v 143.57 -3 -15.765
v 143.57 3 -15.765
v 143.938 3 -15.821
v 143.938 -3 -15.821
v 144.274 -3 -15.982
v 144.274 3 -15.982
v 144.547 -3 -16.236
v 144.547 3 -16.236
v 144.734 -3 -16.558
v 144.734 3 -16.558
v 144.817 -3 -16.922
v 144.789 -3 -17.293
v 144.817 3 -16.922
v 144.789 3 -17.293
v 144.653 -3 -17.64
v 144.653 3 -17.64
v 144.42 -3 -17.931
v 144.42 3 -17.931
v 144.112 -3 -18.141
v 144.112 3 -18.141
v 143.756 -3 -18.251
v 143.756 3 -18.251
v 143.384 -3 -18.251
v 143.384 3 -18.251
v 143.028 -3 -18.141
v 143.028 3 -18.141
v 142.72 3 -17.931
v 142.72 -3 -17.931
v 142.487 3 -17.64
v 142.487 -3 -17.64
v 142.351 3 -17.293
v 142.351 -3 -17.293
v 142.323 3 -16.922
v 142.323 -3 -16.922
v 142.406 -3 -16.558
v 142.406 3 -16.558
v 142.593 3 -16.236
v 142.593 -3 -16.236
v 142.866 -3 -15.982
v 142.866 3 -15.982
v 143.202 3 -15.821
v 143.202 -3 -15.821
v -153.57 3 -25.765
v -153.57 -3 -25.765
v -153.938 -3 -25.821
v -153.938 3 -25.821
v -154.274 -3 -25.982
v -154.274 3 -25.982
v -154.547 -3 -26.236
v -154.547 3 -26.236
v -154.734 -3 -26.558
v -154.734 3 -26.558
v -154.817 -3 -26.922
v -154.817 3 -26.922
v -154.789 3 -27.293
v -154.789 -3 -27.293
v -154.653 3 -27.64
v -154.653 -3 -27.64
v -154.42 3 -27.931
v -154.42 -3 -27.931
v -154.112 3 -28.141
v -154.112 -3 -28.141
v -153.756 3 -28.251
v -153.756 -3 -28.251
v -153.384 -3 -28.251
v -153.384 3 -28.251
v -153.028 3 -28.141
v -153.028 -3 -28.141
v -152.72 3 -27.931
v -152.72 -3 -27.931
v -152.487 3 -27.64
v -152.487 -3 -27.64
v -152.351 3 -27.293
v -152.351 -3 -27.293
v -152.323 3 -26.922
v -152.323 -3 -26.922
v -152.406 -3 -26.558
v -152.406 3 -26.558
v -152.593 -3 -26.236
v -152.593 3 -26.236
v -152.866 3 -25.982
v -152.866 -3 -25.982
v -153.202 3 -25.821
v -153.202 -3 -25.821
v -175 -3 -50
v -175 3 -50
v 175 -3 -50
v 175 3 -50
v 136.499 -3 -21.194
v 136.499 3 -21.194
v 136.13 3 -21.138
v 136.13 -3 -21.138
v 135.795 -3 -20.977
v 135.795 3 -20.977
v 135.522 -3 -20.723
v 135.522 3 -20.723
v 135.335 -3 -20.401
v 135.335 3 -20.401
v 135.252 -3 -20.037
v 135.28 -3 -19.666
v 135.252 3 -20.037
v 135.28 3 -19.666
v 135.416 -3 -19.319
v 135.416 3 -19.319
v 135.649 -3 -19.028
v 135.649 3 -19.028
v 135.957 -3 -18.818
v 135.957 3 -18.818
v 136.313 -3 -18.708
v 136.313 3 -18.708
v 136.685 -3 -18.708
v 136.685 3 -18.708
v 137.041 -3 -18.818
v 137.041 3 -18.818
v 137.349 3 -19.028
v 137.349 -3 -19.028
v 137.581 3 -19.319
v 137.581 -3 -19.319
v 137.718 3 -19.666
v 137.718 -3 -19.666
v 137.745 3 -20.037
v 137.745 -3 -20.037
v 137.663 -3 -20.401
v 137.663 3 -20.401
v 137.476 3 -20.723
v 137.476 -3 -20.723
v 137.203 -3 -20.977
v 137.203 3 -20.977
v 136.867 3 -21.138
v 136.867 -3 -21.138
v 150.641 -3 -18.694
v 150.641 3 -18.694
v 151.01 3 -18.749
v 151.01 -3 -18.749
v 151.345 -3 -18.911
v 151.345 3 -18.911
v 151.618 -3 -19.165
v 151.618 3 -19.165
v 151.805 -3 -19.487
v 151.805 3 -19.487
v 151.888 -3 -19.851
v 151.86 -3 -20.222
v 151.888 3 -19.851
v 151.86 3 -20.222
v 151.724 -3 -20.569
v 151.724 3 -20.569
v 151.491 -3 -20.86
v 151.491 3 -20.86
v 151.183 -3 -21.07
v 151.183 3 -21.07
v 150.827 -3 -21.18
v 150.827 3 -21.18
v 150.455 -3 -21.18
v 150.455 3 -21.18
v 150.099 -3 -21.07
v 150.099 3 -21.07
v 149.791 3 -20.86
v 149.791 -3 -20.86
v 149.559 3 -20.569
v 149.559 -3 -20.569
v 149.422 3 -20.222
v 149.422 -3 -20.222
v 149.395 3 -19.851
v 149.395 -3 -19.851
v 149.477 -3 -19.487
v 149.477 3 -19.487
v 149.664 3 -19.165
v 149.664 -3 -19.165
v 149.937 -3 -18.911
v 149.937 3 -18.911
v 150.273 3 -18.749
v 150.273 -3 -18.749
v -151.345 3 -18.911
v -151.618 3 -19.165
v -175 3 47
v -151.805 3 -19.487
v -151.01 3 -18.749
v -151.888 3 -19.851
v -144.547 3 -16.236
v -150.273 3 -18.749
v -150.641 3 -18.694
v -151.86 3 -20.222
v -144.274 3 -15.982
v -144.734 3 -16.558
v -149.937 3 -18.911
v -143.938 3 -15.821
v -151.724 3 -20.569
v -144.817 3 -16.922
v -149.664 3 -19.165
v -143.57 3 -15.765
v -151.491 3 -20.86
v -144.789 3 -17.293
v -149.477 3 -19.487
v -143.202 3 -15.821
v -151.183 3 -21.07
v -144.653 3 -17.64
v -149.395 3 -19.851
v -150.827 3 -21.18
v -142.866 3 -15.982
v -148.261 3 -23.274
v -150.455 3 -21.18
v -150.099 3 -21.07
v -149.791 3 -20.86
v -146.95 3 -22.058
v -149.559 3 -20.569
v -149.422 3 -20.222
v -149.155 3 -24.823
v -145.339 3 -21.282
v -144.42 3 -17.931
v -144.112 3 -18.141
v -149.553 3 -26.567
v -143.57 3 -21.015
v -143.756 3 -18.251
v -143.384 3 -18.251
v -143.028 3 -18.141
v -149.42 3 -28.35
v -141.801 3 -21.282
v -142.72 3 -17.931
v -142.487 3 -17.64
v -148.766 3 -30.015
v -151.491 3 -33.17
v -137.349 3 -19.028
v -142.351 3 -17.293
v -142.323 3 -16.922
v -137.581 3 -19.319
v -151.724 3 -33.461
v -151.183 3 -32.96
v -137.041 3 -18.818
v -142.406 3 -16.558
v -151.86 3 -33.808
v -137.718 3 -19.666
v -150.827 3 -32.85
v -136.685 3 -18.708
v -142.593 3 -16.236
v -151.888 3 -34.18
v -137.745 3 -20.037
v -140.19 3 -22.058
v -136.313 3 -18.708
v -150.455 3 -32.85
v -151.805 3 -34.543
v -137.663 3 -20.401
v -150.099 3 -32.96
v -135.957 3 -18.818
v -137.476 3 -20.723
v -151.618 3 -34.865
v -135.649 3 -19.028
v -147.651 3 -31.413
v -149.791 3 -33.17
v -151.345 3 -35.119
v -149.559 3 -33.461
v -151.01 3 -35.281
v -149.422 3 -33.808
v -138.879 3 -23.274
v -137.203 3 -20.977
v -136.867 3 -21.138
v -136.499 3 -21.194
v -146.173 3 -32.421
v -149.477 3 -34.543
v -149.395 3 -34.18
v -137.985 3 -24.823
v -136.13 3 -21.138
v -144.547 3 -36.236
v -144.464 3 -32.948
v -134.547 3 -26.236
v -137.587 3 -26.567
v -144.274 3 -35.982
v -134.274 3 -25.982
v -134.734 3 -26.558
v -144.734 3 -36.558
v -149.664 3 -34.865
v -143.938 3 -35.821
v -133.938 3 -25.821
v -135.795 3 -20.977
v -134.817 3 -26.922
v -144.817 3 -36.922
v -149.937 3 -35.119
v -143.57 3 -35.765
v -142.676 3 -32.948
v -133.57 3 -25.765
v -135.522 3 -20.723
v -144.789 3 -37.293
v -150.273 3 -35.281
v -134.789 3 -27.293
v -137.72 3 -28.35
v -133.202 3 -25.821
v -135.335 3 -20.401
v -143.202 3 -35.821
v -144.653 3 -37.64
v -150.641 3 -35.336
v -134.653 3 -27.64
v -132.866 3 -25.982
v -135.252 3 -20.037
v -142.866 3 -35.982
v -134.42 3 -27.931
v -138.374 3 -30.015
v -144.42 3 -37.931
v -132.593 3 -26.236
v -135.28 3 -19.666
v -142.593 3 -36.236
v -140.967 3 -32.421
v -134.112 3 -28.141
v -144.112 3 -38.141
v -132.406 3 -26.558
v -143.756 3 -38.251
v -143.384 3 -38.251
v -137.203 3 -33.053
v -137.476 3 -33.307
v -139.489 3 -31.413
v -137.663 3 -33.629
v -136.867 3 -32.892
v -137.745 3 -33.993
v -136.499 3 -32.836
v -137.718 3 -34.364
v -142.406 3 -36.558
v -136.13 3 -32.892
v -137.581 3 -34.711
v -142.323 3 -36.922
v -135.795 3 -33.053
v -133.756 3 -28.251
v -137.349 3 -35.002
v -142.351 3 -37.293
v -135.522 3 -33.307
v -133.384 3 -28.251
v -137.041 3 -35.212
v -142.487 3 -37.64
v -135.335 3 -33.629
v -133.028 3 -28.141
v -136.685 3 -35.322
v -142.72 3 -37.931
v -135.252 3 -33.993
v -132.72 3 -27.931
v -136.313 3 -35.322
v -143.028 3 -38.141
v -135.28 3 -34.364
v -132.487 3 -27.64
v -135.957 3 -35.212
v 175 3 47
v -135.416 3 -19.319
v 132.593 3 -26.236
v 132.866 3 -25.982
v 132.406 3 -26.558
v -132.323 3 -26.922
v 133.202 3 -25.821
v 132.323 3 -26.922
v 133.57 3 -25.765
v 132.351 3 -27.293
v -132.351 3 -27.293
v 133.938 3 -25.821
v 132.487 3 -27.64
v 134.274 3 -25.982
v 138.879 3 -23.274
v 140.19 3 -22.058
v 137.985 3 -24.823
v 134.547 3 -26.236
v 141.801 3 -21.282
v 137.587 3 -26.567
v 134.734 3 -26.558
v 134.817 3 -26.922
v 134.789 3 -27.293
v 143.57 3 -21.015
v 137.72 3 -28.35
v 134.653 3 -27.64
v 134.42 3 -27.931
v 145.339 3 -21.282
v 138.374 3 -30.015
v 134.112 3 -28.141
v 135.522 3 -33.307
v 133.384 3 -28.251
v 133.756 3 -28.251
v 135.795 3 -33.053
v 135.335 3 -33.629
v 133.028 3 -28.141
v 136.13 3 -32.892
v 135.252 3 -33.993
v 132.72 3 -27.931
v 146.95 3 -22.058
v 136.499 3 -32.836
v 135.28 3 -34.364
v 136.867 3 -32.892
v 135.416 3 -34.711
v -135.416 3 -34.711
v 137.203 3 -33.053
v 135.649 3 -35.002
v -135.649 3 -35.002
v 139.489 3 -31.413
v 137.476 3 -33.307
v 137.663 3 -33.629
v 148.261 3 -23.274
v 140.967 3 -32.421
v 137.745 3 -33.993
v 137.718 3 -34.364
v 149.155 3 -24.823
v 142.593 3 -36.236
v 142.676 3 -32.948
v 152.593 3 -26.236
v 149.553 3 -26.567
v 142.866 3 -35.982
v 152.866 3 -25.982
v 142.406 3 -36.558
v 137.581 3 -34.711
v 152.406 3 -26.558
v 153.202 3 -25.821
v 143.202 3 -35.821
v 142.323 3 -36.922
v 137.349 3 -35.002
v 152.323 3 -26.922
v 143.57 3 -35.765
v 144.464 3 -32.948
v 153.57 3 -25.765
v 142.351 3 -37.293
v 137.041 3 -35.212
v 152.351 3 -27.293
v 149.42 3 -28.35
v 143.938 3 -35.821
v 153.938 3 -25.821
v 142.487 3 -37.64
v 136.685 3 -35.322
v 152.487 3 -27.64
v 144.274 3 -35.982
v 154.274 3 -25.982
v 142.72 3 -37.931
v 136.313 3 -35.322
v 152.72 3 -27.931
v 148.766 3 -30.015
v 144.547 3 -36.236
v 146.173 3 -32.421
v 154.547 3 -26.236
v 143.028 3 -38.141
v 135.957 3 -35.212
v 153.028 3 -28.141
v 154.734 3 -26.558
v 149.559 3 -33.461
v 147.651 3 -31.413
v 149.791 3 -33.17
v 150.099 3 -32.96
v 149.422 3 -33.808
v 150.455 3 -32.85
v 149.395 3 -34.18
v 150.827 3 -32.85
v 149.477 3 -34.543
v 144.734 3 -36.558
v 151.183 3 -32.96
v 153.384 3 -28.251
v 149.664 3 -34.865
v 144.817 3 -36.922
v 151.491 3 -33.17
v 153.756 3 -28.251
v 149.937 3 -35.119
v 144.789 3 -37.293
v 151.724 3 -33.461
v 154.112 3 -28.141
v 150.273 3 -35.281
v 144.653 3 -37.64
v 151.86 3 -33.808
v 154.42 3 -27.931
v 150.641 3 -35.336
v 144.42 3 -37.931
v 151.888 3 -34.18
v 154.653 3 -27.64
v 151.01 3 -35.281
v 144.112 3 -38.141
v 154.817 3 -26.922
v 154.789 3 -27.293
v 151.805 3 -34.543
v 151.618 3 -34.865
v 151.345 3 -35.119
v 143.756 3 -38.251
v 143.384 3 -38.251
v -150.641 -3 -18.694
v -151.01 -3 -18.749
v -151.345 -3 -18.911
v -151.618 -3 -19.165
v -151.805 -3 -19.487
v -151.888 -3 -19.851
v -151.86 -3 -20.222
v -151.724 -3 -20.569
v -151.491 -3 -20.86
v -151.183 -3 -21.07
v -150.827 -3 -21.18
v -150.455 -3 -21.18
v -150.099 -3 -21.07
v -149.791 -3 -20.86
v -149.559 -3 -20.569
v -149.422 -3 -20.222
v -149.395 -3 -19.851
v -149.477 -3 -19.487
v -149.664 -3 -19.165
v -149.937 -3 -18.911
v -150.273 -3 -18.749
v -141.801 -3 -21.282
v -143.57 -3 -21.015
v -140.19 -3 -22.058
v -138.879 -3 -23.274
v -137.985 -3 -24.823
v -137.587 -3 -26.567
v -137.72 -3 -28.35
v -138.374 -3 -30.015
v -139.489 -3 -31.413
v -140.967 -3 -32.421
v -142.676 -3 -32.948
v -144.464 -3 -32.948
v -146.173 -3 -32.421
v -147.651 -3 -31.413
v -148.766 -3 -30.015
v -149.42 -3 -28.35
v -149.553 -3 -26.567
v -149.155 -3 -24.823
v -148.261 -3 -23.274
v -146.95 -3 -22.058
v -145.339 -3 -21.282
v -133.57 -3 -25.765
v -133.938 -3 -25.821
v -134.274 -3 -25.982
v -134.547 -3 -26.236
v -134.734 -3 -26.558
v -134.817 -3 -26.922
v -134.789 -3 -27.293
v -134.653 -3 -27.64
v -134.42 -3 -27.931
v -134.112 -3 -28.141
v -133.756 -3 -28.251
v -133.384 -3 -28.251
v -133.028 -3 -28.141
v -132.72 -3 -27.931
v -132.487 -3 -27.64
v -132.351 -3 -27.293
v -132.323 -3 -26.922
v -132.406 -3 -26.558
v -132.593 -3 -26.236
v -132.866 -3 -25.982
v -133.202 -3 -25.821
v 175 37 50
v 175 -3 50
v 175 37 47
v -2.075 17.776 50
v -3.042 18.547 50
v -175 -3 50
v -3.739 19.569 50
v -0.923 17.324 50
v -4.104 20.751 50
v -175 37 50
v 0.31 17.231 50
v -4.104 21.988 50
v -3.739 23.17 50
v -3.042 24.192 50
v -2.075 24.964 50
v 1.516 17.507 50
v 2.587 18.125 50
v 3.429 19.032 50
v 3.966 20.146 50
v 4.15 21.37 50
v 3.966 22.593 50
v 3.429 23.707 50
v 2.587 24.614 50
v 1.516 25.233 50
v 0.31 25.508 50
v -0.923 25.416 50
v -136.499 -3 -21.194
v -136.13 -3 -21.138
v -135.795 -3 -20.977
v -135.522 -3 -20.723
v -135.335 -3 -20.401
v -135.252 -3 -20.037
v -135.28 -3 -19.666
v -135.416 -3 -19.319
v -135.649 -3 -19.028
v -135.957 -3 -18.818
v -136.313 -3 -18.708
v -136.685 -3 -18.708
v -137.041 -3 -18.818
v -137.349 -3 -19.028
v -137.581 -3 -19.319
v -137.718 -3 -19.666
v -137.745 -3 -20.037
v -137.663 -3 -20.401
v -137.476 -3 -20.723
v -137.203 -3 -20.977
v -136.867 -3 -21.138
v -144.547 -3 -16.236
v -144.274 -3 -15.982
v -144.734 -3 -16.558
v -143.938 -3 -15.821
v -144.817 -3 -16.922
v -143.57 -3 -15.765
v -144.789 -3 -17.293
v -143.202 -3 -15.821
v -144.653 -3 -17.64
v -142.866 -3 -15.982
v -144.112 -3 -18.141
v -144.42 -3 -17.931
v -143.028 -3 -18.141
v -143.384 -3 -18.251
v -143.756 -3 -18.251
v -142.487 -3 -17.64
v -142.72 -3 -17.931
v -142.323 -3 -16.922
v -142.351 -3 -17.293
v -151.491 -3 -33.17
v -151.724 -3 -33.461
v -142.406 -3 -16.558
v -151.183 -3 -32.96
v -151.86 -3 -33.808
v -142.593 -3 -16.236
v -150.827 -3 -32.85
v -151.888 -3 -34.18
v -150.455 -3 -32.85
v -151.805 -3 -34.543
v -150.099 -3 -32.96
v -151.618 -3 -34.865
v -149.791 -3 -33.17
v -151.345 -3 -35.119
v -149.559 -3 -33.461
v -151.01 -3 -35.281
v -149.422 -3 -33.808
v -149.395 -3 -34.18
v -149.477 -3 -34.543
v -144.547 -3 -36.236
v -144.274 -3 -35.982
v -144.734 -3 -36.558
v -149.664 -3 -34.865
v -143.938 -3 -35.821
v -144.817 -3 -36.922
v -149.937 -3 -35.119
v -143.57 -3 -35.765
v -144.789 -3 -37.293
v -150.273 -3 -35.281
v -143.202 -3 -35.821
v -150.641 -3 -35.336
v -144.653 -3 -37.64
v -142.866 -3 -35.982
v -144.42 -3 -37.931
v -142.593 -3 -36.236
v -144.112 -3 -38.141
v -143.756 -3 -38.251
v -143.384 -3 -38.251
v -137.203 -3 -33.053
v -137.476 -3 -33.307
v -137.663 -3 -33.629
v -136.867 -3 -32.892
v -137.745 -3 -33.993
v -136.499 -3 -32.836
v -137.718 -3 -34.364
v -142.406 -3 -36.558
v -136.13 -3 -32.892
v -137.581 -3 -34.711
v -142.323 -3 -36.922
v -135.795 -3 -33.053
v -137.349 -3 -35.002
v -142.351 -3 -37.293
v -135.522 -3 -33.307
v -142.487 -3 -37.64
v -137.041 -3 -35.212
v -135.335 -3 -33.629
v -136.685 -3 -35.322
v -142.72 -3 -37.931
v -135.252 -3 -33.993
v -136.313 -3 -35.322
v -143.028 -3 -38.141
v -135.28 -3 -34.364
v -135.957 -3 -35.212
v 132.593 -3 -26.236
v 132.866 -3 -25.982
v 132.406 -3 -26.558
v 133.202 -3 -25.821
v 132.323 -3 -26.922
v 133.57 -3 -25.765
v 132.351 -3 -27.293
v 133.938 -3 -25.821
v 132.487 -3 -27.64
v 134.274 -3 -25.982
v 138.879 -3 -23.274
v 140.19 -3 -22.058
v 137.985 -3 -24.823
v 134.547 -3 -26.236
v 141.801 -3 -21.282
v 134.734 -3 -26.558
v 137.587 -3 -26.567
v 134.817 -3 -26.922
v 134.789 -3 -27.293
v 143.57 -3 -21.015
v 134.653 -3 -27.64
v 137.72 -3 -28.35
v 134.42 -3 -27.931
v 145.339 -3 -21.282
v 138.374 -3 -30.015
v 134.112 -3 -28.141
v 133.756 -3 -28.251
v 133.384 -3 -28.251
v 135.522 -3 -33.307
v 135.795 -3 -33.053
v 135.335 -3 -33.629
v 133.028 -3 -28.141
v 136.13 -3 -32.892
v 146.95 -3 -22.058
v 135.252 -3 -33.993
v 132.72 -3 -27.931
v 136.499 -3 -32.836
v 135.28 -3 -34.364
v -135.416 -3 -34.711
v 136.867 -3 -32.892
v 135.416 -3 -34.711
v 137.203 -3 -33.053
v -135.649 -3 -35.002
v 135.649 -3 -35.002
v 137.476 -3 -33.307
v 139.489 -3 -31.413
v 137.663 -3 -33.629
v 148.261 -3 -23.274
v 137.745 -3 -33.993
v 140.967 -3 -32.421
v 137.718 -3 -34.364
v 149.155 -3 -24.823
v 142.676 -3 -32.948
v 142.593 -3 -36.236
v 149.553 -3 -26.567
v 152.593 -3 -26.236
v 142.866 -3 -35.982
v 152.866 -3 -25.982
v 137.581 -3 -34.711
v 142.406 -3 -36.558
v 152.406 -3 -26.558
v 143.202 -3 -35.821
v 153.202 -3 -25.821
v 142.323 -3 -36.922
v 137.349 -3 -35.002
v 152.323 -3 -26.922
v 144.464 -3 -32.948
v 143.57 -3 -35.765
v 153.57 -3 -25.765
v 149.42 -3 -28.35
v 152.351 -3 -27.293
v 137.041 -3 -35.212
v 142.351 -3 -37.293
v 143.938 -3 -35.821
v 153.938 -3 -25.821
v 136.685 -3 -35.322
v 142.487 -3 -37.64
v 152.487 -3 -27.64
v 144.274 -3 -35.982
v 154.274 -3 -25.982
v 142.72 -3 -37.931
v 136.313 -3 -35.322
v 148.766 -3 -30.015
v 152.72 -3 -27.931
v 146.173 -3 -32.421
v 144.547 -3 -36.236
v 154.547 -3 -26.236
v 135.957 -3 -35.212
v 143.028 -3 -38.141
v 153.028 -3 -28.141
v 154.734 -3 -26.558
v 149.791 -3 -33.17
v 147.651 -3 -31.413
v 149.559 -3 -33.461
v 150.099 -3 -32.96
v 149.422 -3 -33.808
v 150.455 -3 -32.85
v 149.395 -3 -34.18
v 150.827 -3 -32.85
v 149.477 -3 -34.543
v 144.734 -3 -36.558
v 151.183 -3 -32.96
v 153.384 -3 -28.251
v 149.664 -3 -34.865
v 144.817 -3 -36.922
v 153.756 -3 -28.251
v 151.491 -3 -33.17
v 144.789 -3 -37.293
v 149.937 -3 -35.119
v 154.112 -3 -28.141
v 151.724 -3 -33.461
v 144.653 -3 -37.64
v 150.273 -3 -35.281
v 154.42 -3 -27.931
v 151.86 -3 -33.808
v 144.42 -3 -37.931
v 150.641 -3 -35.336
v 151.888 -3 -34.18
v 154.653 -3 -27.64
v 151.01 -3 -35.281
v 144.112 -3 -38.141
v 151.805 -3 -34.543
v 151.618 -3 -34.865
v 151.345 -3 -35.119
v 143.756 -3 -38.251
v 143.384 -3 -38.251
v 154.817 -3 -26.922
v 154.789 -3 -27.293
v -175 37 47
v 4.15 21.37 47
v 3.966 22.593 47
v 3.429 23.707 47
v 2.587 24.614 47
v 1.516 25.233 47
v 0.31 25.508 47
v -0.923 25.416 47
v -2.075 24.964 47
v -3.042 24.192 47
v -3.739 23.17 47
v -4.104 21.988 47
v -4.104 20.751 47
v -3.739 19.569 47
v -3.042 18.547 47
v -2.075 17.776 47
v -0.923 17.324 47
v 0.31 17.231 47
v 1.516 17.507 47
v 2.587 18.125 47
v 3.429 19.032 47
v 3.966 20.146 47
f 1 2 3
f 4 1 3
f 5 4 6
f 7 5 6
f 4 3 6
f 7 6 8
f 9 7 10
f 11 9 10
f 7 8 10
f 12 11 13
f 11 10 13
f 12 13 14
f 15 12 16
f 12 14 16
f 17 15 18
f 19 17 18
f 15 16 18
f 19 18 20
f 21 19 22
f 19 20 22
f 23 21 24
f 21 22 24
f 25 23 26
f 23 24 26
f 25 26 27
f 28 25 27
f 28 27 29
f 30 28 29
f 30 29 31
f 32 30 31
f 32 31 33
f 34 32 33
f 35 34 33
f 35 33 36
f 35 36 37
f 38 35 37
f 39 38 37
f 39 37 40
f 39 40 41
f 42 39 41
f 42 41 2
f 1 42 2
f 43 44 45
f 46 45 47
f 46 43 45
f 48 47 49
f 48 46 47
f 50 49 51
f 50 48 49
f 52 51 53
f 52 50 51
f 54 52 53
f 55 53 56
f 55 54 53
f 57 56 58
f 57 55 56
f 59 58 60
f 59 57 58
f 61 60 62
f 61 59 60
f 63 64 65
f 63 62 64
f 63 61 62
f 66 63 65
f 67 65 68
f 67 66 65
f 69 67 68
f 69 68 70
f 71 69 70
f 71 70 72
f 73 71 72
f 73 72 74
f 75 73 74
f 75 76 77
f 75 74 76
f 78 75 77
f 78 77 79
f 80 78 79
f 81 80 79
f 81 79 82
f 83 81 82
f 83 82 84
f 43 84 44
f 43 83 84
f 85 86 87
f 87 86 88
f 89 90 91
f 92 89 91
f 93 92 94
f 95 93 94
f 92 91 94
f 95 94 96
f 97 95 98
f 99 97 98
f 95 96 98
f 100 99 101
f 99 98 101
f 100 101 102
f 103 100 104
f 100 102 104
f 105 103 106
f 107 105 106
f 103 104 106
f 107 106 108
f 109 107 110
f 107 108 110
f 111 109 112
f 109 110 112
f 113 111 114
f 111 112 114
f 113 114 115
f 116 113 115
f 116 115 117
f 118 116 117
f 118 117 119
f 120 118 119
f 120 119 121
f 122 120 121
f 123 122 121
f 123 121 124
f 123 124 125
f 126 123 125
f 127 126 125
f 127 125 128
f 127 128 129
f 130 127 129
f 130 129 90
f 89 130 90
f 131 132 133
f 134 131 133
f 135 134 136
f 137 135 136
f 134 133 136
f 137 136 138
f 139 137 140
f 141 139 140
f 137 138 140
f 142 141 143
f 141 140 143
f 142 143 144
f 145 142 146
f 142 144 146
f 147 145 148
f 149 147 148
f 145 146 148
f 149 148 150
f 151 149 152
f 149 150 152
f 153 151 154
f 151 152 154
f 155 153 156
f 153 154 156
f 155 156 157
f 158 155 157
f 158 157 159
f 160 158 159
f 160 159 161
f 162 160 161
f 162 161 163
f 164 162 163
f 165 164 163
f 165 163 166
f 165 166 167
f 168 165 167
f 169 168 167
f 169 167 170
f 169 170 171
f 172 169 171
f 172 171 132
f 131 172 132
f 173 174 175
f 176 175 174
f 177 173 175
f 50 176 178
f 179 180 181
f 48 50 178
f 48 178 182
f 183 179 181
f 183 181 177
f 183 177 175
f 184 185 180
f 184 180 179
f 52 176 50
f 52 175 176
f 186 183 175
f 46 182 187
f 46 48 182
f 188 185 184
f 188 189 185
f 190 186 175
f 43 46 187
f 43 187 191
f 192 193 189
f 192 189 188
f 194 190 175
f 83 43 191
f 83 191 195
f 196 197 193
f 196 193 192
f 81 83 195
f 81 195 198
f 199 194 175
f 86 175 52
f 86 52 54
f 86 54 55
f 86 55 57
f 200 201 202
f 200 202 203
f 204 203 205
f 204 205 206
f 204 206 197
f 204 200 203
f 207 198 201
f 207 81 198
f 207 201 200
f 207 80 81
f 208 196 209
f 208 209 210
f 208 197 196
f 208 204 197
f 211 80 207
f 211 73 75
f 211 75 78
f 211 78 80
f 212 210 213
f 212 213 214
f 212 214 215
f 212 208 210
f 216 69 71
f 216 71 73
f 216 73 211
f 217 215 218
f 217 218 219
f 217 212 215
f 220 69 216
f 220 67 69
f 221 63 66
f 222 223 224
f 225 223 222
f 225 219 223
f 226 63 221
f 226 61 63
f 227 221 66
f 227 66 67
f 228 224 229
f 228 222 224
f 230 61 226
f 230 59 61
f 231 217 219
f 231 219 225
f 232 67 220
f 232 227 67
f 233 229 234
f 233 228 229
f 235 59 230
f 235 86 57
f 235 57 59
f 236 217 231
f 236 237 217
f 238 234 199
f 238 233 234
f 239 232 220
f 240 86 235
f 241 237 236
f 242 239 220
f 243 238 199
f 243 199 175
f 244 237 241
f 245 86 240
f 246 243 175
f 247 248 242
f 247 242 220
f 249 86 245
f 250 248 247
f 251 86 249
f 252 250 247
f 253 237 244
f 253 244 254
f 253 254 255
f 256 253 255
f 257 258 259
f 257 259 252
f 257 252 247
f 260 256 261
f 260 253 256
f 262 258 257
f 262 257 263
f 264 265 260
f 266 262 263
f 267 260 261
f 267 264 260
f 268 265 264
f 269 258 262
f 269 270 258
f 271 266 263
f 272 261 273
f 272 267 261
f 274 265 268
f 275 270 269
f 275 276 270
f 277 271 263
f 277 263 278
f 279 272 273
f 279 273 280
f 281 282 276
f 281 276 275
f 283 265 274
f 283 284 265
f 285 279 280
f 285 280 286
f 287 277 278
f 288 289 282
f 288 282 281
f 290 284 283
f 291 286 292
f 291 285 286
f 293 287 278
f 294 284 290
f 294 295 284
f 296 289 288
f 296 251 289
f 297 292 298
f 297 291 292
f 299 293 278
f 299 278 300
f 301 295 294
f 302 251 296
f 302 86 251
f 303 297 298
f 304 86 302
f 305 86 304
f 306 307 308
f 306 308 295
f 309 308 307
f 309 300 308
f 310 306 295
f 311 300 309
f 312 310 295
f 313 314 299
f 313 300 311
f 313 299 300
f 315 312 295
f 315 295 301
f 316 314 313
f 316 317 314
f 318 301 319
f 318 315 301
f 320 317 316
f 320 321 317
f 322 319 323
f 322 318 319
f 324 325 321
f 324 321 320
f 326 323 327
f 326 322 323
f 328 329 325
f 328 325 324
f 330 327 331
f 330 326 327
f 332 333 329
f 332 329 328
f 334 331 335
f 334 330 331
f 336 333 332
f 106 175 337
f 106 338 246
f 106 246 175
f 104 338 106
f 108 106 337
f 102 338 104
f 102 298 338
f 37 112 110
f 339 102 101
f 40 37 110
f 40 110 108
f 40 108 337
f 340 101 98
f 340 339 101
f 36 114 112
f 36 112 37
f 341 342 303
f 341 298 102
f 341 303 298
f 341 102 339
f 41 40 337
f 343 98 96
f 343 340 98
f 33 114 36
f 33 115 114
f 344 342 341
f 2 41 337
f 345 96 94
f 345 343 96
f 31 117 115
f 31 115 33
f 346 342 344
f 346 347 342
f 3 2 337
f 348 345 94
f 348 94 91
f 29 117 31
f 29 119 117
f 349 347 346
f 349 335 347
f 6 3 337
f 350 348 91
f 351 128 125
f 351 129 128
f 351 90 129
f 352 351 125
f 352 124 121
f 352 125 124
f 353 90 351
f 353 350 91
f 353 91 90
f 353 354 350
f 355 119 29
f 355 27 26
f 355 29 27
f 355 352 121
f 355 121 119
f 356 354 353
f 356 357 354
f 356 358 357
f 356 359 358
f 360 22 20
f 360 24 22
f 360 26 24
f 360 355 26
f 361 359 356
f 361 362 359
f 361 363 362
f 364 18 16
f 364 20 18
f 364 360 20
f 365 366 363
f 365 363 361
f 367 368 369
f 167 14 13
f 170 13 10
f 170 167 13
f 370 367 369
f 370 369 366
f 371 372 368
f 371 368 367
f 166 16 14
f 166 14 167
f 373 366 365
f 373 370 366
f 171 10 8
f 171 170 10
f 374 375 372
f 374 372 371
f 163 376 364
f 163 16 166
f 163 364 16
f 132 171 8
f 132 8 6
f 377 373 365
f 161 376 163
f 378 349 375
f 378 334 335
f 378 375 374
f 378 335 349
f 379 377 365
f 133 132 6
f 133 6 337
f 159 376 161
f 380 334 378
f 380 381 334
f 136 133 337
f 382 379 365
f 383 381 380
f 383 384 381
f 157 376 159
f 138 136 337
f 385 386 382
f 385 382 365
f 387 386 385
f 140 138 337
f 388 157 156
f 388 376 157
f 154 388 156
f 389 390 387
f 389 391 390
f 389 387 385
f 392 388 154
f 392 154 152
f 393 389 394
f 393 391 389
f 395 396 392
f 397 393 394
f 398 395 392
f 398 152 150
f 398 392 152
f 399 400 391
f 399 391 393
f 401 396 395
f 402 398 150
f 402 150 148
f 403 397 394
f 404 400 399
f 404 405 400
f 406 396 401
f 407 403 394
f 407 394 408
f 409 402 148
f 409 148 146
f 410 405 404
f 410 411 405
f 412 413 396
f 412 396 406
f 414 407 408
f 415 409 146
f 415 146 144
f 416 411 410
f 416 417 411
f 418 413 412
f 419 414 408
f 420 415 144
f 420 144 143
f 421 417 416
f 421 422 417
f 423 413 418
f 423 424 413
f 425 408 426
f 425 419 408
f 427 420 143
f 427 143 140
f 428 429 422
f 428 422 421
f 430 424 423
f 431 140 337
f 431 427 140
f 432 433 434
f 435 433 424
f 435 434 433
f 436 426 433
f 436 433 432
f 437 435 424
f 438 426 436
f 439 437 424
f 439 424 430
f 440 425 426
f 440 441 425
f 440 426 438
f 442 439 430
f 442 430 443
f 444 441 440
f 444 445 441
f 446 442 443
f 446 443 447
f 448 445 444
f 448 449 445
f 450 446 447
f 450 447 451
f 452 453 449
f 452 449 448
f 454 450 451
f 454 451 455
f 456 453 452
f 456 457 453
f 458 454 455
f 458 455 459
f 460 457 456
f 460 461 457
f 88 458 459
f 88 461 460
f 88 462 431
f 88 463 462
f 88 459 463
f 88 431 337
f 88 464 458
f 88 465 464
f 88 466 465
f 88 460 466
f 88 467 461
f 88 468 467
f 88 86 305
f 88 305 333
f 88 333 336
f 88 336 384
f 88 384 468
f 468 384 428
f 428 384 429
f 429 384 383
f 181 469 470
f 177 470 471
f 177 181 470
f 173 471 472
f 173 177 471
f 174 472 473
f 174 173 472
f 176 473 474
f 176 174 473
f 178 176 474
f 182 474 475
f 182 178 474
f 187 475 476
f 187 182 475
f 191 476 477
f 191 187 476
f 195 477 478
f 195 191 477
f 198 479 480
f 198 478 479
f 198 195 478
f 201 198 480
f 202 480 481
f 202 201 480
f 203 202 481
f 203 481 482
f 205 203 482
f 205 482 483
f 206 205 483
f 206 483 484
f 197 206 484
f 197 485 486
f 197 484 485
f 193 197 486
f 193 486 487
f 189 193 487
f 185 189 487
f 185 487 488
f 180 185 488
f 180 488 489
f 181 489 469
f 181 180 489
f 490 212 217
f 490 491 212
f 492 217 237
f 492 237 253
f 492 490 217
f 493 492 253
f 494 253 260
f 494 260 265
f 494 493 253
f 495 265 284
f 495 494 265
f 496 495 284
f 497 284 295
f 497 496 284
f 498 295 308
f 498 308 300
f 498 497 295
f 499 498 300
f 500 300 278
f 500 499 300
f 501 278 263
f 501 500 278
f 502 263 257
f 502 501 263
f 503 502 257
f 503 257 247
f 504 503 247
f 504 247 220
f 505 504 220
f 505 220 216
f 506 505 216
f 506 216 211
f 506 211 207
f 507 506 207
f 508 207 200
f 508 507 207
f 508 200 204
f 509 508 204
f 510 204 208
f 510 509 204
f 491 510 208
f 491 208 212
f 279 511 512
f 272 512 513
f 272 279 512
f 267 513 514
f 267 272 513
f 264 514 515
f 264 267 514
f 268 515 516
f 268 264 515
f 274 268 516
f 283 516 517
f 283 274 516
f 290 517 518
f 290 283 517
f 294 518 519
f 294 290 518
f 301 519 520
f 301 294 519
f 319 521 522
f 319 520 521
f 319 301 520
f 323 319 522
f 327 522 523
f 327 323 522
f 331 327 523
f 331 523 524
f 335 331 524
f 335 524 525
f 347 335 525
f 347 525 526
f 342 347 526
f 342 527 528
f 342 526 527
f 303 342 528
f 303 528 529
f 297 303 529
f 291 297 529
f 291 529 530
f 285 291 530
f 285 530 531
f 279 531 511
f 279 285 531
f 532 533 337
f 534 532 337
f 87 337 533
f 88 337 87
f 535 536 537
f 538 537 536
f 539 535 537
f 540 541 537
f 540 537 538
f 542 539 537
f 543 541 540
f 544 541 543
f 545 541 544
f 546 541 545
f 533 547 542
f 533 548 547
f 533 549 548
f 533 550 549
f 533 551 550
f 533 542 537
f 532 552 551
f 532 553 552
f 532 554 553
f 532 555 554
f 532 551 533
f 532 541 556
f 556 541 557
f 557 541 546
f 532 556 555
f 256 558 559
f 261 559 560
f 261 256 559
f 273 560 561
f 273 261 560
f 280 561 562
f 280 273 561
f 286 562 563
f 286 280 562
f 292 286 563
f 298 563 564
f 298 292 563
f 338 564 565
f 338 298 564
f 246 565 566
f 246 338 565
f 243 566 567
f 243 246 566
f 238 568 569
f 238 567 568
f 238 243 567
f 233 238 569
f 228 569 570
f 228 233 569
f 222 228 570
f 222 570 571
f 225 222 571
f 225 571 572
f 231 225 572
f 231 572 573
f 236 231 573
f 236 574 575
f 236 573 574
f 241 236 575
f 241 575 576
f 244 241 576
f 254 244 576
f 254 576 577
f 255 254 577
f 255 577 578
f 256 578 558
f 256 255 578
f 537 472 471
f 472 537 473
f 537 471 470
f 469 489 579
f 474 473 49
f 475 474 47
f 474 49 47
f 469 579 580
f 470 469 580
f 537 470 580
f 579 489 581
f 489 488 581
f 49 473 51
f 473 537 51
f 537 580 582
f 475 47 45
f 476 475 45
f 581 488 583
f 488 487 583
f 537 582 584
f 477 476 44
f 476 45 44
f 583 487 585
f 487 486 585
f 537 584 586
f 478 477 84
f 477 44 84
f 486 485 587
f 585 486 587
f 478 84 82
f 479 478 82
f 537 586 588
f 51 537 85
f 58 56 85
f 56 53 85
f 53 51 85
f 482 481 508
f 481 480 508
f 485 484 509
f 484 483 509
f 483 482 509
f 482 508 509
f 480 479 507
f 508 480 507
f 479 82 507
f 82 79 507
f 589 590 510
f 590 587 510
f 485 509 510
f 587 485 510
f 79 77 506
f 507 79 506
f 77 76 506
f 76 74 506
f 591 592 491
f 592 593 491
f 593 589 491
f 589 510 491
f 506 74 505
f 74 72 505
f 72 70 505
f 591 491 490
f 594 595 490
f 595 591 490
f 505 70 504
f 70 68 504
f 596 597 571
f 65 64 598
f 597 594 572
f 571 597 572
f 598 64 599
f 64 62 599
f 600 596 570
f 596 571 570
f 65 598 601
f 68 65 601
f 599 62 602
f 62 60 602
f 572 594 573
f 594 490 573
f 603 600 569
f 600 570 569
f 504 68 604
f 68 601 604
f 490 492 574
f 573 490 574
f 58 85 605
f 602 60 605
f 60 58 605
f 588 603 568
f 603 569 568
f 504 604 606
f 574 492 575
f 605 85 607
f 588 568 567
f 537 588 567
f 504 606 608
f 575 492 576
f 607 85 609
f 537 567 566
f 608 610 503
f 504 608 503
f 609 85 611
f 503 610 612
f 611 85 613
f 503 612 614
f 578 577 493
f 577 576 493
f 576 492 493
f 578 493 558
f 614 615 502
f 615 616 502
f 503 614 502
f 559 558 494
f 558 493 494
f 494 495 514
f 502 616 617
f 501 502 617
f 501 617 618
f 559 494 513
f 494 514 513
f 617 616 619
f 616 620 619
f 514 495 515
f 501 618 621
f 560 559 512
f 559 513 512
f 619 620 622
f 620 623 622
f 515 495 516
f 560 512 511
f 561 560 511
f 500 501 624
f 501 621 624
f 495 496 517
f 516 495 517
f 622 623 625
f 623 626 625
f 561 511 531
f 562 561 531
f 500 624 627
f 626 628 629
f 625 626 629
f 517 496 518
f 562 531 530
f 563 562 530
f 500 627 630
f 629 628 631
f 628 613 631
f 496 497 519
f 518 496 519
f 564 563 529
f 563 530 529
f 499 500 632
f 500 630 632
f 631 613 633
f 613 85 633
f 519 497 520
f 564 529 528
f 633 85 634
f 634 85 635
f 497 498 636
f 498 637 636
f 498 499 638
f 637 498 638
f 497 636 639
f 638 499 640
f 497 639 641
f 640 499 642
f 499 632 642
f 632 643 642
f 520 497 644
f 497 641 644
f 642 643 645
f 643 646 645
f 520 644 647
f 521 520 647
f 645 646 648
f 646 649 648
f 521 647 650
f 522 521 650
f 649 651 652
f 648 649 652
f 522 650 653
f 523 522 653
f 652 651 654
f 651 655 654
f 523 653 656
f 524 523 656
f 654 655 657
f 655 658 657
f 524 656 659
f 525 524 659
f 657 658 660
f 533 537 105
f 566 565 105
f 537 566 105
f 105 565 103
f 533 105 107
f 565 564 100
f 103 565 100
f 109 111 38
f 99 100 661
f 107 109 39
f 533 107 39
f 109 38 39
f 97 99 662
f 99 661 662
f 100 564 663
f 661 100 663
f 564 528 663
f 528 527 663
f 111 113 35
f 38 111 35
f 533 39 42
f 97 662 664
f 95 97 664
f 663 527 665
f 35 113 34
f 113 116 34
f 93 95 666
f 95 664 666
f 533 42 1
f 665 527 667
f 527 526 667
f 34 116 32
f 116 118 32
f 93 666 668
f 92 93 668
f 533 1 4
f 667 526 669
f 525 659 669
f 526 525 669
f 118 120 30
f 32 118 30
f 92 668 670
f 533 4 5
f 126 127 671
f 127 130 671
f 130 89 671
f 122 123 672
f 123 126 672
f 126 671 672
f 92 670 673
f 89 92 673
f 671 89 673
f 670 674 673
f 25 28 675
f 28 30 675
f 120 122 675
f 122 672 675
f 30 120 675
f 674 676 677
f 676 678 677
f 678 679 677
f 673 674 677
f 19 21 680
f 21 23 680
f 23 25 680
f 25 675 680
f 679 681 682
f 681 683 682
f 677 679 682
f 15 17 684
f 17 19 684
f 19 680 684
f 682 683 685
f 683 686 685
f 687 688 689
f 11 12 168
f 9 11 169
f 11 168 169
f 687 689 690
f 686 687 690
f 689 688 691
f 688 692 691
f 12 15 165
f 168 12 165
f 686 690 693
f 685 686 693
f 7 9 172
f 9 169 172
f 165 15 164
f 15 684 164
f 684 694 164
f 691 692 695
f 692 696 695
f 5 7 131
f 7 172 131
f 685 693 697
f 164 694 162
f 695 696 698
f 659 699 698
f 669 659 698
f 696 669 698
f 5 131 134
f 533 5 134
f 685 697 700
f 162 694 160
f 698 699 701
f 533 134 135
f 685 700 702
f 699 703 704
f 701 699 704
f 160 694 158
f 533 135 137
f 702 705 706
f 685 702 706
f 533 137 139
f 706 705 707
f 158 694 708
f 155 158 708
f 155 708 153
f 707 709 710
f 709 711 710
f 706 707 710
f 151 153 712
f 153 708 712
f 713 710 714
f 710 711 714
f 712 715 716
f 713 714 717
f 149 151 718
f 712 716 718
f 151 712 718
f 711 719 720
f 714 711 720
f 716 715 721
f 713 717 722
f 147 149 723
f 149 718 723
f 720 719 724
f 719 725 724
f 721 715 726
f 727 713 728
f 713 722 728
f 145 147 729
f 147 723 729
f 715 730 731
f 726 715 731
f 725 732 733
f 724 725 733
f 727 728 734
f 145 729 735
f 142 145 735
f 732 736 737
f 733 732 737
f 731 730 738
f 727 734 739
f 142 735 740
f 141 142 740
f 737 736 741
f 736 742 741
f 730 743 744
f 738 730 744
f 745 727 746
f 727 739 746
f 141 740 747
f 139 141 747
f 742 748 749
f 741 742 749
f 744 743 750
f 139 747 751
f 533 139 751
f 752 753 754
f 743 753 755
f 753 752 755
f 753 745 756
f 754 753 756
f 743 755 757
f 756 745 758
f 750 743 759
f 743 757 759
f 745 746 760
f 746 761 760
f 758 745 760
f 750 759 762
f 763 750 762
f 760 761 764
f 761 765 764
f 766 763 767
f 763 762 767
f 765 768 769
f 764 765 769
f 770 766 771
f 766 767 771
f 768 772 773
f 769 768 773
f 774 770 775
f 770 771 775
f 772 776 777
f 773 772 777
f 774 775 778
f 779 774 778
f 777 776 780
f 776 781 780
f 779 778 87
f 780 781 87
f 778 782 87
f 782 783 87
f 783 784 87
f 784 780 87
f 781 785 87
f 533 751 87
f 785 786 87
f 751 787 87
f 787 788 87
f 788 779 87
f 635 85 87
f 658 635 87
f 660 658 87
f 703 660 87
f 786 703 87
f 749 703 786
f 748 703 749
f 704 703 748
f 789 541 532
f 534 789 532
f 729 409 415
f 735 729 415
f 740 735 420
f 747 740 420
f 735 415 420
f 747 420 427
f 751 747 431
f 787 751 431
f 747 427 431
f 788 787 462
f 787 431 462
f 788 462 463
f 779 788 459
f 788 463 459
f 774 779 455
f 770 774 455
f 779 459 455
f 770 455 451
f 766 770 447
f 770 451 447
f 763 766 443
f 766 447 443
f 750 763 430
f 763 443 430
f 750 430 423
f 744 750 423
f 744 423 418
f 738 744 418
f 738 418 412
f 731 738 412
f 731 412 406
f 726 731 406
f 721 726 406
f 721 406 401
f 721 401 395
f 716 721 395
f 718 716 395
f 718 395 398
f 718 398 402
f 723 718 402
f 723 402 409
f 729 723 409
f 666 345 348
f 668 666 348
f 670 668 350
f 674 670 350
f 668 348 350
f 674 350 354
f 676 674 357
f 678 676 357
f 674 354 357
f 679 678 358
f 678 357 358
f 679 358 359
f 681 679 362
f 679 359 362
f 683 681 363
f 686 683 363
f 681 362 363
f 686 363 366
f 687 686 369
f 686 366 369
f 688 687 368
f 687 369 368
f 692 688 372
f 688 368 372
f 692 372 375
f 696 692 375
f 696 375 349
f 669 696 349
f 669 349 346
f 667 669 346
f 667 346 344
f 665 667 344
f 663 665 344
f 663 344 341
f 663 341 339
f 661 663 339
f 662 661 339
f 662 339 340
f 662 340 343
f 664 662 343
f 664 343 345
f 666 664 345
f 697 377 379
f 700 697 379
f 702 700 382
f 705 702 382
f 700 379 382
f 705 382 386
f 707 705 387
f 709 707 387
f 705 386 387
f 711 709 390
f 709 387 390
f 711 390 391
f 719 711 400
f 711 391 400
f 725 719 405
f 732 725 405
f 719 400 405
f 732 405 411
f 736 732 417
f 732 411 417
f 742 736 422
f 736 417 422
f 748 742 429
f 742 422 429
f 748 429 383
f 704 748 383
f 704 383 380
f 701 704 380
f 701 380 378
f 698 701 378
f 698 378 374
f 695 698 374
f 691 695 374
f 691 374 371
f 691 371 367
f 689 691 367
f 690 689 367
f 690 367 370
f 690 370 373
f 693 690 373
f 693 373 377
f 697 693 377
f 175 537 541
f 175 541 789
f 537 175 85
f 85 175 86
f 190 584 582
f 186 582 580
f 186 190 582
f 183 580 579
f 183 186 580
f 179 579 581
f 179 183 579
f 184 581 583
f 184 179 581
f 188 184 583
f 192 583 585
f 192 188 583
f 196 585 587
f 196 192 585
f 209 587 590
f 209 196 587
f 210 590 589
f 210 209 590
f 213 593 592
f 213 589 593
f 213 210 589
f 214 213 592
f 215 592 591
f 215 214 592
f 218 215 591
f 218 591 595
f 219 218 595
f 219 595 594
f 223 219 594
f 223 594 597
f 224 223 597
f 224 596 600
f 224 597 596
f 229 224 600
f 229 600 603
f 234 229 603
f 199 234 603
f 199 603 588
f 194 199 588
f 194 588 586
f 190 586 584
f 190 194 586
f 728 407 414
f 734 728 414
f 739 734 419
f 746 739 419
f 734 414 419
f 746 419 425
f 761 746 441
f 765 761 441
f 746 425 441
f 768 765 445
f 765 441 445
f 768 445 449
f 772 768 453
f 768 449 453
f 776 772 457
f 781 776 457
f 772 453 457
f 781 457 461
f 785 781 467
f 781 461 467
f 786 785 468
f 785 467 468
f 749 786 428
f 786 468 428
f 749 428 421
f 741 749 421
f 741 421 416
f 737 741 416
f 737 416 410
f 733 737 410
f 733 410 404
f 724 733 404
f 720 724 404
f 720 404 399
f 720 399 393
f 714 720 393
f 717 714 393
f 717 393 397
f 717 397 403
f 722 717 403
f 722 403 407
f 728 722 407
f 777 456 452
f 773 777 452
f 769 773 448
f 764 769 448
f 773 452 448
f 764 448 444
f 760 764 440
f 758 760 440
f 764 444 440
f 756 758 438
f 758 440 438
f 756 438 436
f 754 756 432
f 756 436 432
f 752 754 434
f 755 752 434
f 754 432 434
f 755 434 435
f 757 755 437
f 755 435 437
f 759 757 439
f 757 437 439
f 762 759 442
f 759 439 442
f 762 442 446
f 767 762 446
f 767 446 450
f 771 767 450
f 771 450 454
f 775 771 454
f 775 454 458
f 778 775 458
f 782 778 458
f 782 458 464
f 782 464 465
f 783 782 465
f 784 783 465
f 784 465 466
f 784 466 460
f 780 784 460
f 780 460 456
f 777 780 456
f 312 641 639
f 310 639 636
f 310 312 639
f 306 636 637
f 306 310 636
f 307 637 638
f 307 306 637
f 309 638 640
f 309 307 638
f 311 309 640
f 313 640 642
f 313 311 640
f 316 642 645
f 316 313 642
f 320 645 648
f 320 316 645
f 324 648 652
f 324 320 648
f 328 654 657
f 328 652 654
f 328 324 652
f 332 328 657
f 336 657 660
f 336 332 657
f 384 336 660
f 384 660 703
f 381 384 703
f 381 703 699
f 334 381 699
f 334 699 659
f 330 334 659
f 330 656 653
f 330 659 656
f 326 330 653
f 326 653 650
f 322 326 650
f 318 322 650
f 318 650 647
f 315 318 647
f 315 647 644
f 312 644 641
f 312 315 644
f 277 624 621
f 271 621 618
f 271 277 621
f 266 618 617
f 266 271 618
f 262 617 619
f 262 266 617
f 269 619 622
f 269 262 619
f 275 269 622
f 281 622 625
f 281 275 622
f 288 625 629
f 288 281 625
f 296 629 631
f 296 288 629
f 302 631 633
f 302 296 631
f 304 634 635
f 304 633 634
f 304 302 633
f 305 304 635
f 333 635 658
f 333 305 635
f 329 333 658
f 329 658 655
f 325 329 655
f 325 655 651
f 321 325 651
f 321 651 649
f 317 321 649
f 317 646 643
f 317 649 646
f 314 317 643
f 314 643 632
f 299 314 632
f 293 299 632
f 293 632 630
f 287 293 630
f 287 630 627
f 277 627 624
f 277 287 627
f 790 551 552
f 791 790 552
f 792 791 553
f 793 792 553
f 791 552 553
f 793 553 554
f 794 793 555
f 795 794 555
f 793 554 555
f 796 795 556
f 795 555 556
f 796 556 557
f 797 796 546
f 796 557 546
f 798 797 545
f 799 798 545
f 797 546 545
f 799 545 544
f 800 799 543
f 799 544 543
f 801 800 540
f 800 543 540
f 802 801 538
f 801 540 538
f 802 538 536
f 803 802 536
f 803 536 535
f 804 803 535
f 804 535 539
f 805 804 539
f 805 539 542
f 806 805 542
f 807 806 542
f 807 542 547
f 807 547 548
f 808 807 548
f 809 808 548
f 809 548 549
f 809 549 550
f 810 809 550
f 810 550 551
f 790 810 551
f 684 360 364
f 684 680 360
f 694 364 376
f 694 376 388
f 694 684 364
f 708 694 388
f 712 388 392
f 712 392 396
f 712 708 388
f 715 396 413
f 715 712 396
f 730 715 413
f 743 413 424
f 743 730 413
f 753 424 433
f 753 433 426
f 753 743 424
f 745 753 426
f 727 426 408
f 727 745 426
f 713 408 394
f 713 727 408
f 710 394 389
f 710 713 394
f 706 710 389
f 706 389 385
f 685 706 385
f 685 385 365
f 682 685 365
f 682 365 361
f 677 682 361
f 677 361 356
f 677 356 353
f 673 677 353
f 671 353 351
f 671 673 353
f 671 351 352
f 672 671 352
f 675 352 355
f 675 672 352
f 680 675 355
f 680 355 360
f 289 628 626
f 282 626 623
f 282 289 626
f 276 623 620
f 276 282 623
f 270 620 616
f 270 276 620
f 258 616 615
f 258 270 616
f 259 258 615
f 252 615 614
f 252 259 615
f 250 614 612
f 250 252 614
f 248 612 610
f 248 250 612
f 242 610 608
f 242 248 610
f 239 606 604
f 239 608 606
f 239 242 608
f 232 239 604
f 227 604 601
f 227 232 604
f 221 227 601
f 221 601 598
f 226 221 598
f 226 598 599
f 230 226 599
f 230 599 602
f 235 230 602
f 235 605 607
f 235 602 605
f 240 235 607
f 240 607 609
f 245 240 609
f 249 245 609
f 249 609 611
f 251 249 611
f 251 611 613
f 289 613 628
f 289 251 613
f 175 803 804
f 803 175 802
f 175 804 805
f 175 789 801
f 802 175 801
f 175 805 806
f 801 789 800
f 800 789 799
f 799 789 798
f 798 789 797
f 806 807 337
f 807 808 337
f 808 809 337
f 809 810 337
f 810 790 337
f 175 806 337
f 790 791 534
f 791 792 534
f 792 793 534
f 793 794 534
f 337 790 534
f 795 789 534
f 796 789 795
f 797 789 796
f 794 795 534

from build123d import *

# Parameters (mm, degrees)
SKETCH1_W           = 350
SKETCH1_H           = 100
SKETCH1_R           = 6
BOSS_EXTRUDE1_DEPTH = 3
SKETCH2_W           = 350
SKETCH2_H           = 40
BOSS_EXTRUDE2_DEPTH = 3
SKETCH3_R           = 4.15
CUT_EXTRUDE1_DEPTH  = 205.924376295
SKETCH4_R           = 1.25
CUT_EXTRUDE2_DEPTH  = 186.151289491


with BuildPart() as part:
    # Sketch1 → Boss-Extrude1 (new, symmetric)
    with BuildSketch(Plane(origin=(0, 0, 0), x_dir=(1, 0, 0), z_dir=(0, 1, 0))):
        Rectangle(SKETCH1_W, SKETCH1_H)
        with Locations(Location((143.57, 27.01502743, 0), (0, 0, 270))):
            Circle(SKETCH1_R, mode=Mode.SUBTRACT)
        with Locations(Location((-143.57, 27.01502743, 0), (0, 0, 270))):
            Circle(SKETCH1_R, mode=Mode.SUBTRACT)
    extrude(amount=BOSS_EXTRUDE1_DEPTH, both=True)

    # Sketch2 → Boss-Extrude2 (add)
    with BuildSketch(Plane.XY.offset(50)):
        with Locations((0, 17)):
            Rectangle(SKETCH2_W, SKETCH2_H)
    extrude(amount=-BOSS_EXTRUDE2_DEPTH)

    # Sketch3 → Cut-Extrude1 (cut, through all)
    with BuildSketch(Plane.XY.offset(50)):
        with Locations((0, 21.369646437)):
            Circle(SKETCH3_R)
    extrude(amount=-CUT_EXTRUDE1_DEPTH, mode=Mode.SUBTRACT)

    # Sketch4 → Cut-Extrude2 (cut, through all)
    with BuildSketch(Plane(origin=(0, 3, 0), x_dir=(1, 0, 0), z_dir=(0, 1, 0))):
        with Locations(Location((143.57, 37.01502743, 0), (0, 0, 270))):
            Circle(SKETCH4_R)
        with Locations(Location((153.57, 27.01502743, 0), (0, 0, 270))):
            Circle(SKETCH4_R)
        with Locations(Location((143.57, 17.01502743, 0), (0, 0, 270))):
            Circle(SKETCH4_R)
        with Locations(Location((133.57, 27.01502743, 0), (0, 0, 270))):
            Circle(SKETCH4_R)
        with Locations(Location((136.498932188, 34.086095242, 0), (0, 0, 270))):
            Circle(SKETCH4_R)
        with Locations(Location((150.641067812, 34.086095242, 0), (0, 0, 90))):
            Circle(SKETCH4_R)
        with Locations(Location((150.641067812, 19.943959618, 0), (0, 0, 270))):
            Circle(SKETCH4_R)
        with Locations(Location((136.498932188, 19.943959618, 0), (0, 0, 90))):
            Circle(SKETCH4_R)
    cut_extrude2 = extrude(amount=-CUT_EXTRUDE2_DEPTH, mode=Mode.SUBTRACT)

    # Mirror1: Cut-Extrude2 across plane
    add(cut_extrude2.mirror(Plane(origin=(0, 0, 0), x_dir=(0, 0, 1), z_dir=(1, 0, 0))), mode=Mode.SUBTRACT)


solid = part.part
